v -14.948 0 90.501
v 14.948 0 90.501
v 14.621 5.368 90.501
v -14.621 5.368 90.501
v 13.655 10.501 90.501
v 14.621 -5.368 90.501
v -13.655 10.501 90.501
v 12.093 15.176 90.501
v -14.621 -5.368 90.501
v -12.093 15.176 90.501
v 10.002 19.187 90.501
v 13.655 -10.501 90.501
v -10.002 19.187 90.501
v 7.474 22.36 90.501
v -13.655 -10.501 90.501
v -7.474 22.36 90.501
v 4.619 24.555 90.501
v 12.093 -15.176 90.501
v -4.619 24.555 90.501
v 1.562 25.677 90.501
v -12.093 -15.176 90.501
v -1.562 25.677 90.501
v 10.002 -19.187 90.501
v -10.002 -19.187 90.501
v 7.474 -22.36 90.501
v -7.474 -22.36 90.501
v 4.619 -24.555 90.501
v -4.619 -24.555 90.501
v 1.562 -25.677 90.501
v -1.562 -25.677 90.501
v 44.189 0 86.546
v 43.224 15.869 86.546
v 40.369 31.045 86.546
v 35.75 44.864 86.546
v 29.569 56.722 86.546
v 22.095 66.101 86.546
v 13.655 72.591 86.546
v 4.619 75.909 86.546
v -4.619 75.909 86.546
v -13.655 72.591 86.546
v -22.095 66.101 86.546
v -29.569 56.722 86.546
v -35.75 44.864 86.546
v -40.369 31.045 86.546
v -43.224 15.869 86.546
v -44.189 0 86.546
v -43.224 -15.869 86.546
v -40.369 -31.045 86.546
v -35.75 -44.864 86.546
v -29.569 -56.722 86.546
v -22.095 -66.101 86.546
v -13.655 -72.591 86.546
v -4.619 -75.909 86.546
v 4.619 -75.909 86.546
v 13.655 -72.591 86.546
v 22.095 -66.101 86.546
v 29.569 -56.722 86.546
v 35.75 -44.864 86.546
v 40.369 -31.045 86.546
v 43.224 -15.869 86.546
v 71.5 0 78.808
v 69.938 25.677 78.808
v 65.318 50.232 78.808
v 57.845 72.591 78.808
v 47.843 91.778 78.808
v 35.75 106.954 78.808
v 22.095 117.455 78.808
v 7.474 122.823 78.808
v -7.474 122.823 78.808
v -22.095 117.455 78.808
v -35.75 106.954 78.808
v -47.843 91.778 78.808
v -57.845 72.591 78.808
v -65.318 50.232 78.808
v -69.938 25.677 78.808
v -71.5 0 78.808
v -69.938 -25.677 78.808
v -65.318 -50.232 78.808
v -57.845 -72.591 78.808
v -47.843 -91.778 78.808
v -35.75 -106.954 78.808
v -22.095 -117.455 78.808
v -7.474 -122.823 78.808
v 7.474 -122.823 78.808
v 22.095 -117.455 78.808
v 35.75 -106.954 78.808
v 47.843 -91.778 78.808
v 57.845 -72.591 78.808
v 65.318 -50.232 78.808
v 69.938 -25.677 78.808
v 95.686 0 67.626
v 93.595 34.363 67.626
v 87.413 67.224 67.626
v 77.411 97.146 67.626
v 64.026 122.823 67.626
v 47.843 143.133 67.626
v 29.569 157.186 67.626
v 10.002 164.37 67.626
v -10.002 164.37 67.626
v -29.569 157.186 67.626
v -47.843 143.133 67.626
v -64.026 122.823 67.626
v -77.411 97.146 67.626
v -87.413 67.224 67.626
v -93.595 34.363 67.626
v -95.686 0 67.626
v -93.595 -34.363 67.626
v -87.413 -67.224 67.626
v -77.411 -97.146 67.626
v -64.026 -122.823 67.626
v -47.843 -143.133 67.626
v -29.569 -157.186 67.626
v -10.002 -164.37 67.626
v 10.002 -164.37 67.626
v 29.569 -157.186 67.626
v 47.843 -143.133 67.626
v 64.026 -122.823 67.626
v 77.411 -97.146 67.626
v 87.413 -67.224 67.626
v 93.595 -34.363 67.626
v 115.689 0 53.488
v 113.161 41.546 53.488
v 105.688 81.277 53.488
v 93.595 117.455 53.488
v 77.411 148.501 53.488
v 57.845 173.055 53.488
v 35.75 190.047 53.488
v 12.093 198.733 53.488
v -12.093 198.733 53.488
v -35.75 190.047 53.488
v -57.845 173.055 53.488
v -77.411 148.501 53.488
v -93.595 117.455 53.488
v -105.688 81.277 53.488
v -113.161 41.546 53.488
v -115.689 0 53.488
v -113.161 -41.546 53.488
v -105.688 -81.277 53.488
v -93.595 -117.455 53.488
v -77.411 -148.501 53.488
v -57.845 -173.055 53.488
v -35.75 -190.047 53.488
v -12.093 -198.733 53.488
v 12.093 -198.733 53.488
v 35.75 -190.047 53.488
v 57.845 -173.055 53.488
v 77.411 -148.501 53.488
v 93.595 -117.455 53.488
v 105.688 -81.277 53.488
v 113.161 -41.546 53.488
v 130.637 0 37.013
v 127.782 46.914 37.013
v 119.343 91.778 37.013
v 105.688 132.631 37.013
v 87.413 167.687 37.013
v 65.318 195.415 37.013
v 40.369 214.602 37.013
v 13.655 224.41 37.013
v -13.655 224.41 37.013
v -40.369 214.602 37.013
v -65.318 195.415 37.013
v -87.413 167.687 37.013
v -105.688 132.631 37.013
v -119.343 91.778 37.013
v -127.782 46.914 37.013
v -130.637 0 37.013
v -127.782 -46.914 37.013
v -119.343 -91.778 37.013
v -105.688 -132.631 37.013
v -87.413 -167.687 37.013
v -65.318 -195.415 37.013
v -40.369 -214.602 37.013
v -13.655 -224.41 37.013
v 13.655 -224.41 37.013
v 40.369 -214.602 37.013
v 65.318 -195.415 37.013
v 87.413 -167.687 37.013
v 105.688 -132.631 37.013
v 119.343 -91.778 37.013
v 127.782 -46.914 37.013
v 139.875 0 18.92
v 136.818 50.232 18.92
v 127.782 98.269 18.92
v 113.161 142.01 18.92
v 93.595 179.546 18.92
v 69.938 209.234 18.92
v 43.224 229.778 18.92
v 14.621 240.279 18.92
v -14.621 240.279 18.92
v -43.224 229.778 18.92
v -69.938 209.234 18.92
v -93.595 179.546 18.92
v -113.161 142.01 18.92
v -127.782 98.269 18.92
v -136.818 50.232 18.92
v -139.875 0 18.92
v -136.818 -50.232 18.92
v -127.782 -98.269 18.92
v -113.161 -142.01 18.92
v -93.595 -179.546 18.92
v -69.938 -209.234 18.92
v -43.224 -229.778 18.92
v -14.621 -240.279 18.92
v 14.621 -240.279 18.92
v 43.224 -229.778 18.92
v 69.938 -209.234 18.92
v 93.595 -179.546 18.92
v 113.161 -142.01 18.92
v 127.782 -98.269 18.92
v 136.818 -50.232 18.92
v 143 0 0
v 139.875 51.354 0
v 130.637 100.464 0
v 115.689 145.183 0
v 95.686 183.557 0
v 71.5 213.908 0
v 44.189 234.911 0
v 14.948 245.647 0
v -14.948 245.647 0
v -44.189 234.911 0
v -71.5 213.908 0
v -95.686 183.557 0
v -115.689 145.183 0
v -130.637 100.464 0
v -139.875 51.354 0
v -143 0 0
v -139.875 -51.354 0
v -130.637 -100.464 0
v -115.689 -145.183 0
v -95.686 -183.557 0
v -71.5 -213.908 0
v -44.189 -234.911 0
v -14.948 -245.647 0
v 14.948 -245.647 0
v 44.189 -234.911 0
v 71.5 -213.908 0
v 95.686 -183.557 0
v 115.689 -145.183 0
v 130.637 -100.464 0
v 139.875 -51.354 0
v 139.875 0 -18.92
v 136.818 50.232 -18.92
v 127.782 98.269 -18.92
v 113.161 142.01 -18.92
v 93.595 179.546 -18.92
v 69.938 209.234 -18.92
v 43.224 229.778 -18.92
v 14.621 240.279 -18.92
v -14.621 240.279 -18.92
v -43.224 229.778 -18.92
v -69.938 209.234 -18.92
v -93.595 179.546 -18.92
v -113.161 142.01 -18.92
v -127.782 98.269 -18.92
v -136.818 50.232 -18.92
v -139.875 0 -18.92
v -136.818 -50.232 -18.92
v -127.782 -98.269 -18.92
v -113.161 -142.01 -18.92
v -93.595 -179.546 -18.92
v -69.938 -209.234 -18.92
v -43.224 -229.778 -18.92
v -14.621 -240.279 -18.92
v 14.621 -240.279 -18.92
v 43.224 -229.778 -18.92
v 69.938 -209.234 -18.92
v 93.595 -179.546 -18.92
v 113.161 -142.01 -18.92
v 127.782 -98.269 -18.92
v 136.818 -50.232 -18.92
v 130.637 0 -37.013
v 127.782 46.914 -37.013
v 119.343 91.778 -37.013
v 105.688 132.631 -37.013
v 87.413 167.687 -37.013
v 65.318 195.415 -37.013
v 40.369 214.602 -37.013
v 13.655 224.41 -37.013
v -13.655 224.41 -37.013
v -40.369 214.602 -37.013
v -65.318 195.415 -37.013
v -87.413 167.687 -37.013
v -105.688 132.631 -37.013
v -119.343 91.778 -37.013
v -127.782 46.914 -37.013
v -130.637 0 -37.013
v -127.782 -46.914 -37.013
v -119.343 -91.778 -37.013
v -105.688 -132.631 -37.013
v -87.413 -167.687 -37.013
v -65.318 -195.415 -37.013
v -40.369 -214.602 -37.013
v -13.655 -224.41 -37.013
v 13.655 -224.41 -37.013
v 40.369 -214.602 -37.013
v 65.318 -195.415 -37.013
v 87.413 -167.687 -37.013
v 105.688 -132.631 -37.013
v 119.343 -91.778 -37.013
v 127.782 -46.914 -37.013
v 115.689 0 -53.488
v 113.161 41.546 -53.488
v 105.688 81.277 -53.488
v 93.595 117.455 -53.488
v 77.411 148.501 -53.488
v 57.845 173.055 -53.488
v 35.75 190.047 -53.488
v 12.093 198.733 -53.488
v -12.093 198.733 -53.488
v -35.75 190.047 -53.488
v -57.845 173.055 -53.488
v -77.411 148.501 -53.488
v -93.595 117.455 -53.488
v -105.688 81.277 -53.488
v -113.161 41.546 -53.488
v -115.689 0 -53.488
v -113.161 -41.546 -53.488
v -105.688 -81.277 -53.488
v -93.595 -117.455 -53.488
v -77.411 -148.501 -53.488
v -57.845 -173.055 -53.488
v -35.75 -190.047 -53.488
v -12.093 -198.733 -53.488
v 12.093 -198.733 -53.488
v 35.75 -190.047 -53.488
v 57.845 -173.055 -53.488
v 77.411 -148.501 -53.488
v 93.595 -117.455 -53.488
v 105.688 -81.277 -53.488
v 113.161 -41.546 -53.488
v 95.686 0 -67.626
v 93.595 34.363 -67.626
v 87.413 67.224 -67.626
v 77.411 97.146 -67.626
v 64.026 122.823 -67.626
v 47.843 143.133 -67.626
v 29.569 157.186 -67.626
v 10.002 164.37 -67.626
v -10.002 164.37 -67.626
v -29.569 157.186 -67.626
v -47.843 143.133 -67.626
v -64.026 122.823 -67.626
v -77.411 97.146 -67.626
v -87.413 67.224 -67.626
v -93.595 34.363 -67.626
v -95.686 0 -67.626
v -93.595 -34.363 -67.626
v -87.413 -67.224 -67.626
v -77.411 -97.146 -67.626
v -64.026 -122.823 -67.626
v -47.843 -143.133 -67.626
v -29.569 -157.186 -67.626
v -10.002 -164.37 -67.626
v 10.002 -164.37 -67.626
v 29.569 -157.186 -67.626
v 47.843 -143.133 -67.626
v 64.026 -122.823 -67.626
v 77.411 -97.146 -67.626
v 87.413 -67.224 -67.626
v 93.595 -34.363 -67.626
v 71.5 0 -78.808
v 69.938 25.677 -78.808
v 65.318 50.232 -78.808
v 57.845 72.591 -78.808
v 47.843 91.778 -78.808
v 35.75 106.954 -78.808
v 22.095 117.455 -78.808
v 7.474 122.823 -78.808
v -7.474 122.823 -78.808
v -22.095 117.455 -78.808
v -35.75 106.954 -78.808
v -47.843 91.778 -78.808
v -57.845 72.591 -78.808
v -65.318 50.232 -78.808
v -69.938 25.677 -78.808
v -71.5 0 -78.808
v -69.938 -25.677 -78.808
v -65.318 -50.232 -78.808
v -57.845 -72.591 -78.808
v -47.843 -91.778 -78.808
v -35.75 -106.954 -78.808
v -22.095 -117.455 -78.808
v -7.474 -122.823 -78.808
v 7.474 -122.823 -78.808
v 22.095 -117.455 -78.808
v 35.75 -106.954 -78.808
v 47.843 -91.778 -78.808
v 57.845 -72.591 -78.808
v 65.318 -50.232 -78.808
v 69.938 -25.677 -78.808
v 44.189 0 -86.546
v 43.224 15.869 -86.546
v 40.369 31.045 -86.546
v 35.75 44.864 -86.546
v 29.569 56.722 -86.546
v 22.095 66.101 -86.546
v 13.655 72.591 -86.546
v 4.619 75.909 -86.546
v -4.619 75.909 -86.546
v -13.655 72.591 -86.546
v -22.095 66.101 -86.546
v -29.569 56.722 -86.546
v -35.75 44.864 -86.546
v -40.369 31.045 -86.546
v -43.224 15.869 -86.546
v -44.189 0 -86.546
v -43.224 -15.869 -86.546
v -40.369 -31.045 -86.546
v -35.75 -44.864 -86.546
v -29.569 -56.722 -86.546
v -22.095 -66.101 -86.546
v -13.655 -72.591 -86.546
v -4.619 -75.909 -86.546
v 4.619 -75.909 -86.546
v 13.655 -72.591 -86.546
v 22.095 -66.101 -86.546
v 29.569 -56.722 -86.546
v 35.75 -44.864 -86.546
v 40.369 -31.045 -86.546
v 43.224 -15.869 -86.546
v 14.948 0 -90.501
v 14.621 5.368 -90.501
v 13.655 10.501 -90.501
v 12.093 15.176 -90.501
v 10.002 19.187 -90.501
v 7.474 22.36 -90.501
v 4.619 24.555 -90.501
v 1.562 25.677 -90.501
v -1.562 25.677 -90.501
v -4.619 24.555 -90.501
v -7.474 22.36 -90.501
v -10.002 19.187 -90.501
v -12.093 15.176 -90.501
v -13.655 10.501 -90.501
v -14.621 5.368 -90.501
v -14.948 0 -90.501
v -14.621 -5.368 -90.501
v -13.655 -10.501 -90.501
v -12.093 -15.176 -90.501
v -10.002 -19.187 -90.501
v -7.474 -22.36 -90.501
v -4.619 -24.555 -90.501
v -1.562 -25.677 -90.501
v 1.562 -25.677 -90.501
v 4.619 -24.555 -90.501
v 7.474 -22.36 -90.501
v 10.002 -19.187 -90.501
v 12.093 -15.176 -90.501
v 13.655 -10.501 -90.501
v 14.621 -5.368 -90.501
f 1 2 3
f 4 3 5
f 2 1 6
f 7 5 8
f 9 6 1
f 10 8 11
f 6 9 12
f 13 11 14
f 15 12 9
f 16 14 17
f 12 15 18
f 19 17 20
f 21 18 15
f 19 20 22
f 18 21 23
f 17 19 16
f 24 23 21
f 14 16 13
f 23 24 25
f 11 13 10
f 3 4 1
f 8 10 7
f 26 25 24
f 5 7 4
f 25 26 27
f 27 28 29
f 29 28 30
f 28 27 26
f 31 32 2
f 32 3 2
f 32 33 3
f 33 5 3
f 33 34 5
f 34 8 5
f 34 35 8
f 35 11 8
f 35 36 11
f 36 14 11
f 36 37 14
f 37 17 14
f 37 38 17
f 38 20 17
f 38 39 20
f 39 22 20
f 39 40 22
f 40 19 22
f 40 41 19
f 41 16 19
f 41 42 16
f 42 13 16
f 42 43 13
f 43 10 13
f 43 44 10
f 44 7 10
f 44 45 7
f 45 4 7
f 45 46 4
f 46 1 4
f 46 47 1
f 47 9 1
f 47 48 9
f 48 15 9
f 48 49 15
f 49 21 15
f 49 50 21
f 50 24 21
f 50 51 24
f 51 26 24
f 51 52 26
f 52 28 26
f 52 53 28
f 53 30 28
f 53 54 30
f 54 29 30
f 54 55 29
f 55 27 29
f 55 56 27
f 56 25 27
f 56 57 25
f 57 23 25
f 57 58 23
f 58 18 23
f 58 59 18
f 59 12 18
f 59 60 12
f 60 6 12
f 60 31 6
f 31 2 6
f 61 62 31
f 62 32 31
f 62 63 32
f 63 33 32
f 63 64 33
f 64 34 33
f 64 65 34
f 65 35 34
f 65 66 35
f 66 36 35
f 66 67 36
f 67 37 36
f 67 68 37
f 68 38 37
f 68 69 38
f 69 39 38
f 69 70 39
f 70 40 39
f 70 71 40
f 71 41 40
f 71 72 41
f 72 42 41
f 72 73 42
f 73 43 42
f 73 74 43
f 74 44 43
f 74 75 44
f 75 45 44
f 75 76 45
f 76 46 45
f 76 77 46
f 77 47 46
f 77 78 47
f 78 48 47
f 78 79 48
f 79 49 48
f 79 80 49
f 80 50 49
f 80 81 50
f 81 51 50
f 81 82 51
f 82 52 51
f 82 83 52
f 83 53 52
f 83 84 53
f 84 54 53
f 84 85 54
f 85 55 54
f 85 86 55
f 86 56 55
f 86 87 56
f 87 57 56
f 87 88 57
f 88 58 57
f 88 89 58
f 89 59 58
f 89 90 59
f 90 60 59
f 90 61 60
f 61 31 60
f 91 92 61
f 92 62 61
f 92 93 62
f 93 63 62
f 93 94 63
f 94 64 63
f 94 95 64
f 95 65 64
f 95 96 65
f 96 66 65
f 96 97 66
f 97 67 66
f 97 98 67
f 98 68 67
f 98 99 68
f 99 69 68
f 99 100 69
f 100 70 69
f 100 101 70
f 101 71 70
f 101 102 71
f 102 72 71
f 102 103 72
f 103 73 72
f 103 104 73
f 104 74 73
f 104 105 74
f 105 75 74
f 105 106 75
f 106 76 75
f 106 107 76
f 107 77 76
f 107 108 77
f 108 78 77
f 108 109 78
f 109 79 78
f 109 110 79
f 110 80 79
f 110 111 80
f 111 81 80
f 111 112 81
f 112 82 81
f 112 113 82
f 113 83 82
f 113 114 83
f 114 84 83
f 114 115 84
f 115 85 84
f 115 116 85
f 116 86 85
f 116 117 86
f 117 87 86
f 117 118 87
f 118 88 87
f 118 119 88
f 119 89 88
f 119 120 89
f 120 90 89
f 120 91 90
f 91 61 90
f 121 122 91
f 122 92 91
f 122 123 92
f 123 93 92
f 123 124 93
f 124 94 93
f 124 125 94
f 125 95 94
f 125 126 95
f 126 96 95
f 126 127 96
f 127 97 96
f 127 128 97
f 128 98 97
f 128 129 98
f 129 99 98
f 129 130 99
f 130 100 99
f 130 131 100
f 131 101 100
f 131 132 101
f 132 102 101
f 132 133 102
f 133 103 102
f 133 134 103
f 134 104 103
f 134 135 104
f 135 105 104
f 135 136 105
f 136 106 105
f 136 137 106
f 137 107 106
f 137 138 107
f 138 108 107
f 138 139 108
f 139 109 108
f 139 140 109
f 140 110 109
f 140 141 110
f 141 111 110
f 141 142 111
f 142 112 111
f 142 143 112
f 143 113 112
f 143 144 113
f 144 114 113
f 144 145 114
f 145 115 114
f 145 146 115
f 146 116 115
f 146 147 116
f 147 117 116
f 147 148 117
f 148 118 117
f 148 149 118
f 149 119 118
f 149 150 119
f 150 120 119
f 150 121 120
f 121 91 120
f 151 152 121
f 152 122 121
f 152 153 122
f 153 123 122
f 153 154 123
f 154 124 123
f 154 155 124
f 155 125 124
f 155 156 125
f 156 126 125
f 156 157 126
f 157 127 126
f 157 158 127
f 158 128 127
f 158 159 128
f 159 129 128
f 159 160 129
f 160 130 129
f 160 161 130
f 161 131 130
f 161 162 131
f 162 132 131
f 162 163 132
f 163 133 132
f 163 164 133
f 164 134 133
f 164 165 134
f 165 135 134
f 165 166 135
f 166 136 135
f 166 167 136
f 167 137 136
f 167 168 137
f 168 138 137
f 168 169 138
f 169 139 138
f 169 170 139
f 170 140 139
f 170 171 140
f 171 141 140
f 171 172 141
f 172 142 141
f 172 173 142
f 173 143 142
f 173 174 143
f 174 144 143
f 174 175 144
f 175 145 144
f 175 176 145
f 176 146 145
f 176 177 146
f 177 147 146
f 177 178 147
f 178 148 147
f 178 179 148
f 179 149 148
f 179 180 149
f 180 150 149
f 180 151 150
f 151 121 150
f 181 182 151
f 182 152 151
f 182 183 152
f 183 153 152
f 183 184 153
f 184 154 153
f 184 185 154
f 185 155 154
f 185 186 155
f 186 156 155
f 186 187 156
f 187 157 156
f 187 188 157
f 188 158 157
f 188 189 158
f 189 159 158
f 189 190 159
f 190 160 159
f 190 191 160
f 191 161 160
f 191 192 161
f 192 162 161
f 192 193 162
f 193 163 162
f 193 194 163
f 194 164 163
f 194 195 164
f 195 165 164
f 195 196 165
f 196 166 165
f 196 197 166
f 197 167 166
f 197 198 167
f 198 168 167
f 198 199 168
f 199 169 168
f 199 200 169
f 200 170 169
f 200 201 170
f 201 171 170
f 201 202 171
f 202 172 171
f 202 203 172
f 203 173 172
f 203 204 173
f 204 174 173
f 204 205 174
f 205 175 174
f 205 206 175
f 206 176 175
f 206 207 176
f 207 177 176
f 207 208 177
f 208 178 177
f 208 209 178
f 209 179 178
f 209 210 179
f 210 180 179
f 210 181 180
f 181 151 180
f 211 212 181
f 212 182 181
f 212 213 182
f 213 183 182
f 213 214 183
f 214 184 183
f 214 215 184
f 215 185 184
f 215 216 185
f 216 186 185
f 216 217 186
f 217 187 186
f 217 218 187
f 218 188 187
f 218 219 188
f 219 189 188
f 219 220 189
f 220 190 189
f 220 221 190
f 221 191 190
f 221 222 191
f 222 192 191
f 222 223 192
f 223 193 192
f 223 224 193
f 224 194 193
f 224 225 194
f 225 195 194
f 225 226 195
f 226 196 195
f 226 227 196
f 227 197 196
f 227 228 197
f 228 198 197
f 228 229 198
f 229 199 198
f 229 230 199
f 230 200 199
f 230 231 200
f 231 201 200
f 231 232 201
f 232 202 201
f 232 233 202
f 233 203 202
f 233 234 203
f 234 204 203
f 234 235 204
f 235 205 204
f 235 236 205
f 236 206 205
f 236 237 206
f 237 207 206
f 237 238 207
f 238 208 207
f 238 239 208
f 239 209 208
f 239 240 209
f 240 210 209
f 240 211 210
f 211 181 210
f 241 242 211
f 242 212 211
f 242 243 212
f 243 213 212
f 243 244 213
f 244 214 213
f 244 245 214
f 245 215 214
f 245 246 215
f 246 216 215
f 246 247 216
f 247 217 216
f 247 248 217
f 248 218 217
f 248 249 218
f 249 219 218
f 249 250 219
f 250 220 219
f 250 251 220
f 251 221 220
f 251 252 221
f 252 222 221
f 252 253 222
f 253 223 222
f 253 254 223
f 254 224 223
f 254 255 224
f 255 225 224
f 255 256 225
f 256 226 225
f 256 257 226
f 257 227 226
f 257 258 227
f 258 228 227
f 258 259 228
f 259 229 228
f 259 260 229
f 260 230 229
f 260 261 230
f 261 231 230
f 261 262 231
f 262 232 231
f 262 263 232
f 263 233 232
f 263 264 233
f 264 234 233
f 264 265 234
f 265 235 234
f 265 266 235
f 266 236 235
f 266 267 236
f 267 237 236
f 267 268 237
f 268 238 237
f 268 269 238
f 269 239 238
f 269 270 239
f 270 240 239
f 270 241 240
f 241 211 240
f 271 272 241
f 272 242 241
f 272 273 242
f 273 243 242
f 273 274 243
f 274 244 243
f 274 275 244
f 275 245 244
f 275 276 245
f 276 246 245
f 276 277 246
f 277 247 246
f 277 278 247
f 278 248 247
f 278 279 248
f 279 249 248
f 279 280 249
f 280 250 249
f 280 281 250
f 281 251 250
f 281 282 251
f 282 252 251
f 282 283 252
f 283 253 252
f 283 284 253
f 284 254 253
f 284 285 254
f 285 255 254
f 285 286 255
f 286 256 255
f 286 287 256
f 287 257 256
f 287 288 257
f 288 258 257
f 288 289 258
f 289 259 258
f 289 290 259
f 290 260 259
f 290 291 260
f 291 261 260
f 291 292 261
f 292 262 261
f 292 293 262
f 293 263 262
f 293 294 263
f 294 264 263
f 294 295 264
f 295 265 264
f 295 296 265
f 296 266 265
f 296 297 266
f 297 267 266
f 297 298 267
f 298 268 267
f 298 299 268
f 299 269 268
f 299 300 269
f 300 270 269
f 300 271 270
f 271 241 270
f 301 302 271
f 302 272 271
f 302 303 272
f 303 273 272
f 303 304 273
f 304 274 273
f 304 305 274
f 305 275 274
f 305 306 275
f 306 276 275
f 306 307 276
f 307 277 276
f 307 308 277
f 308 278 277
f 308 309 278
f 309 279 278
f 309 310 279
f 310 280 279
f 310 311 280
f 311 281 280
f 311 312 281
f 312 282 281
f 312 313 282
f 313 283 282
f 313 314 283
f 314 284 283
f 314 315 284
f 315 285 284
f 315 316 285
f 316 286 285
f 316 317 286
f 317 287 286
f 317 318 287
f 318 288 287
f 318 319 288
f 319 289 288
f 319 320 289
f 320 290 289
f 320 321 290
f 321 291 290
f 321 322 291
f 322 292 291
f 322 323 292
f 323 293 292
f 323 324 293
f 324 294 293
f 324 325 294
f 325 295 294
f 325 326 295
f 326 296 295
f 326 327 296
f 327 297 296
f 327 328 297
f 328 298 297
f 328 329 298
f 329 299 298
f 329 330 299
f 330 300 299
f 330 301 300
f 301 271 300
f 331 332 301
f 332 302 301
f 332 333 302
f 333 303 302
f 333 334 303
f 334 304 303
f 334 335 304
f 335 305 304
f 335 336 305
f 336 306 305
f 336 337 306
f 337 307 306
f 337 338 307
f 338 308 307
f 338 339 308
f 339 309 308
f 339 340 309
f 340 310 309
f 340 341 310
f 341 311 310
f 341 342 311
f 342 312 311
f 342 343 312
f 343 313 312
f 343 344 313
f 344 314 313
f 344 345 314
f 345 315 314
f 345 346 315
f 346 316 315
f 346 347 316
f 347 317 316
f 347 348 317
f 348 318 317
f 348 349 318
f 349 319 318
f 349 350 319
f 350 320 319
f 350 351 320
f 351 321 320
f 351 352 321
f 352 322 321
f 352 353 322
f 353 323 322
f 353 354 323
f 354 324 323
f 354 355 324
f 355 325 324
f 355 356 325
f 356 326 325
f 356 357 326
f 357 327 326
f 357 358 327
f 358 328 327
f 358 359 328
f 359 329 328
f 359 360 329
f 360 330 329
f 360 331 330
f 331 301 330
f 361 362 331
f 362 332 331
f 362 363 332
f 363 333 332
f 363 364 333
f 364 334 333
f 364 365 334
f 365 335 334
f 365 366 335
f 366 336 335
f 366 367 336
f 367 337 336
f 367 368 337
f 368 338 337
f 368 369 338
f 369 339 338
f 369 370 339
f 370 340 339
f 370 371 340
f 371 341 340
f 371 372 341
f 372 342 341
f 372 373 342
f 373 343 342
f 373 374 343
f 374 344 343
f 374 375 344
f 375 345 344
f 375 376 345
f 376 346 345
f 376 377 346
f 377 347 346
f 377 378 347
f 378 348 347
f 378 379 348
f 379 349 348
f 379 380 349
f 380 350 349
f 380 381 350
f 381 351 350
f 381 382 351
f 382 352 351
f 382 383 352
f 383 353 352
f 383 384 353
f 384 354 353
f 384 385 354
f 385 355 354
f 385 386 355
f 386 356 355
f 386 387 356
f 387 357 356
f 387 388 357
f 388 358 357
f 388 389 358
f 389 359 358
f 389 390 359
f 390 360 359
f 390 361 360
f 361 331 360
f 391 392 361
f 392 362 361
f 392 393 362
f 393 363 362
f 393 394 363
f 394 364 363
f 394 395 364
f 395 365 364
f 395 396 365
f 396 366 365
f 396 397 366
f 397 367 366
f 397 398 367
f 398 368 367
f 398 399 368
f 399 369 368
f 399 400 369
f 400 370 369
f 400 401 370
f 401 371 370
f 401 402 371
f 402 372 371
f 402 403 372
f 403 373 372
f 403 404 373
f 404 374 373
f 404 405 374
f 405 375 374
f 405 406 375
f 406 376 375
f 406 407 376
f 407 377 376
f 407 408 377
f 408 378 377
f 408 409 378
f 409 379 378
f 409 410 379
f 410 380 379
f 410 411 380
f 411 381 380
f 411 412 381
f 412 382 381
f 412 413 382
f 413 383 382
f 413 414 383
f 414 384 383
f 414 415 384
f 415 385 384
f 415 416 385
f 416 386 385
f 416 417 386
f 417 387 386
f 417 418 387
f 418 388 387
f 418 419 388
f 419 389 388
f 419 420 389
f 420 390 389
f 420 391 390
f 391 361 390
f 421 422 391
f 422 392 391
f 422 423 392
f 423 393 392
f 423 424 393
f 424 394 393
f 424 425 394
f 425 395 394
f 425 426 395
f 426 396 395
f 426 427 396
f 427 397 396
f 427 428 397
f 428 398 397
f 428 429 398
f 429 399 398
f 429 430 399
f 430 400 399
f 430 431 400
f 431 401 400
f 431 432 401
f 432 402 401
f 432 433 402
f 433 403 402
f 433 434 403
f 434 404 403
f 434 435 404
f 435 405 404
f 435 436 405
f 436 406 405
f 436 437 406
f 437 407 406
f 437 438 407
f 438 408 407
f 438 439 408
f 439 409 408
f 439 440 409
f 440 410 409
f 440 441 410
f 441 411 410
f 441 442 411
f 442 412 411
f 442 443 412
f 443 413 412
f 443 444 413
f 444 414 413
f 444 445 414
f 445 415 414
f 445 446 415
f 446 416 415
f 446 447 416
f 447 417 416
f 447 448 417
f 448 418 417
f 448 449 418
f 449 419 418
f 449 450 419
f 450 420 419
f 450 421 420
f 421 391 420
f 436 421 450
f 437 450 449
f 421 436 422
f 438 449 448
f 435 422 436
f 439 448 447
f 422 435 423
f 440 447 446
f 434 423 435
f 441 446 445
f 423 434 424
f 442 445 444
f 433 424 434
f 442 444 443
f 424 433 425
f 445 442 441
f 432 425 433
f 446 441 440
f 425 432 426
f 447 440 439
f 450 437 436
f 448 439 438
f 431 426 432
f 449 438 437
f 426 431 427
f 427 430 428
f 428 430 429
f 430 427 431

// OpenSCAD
// Generated by SolidPython 1.0.1 on 2020-07-29 00:46:50


scale(v = [11, 19, 7]) {
	sphere(r = 13);
}
/***********************************************
*********      SolidPython code:      **********
************************************************
 
# import packages: SolidPython
from solid import *
from solid.utils import *
from itertools import chain, combinations, permutations


class Resize:

    def __init__(self, scad_file):
        self.scad_file = scad_file
        #self.scad_file = import_scad(scad_file)
        # cone/cylinder param:
        self.r1 = 0
        self.r2 = 0
        self.h = 0
        # rectangular prism param:
        self.w = 0
        self.l = 0
        # ellipse param:
        self.r = 0

    # import OpenScad code (file name corresponds to shape)


    # classify shape + parameters
    def assign(self, param1, param2, param3):
        if self.scad_file == 'cone.scad':
            self.r1 = param1
            self.r2 = param2
            self.h = param3
        elif self.scad_file == 'cylinder.scad':
            self.r1 = param1
            self.r2 = param2
            self.h = param3
        elif self.scad_file == 'rectangularPrism.scad':
            self.h = param1
            self.l = param2
            self.w = param3
        else:
            self.r = param1
            self.h = param2

    # resize parameters
    def iterate(self):
        x = range(3, 20, 2)
        i = 1
        if self.scad_file == 'cone.scad':
            tempList = list(permutations(x, 2))
            for temp in tempList:
                param1 = temp[0]
                param2 = temp[1]
                filepath = 'produced_scad_files/' + 'cone' + str(param1) + '_' + str(param2) + '_' + '.scad'
                scad_render_to_file(cylinder(h=param1, r1=param2, r2=0), filepath)

        elif self.scad_file == 'cylinder.scad':
            tempList = list(permutations(x, 3))
            for temp in tempList:
                param1 = temp[0]
                param2 = temp[1]
                filepath = 'produced_scad_files/' + 'cylinder' + str(param1) + '_' + str(param2) + '_' + '.scad'
                scad_render_to_file(cylinder(h=param1, r1=param2, r2=param2), filepath)

        elif self.scad_file == 'rectangularPrism.scad':
            tempList = list(permutations(x, 3))
            for temp in tempList:
                param1 = temp[0]
                param2 = temp[1]
                param3 = temp[2]
                filepath = 'produced_scad_files/' + 'rectangularPrism' + str(param1) + '_' + str(param2) + '_' + str(
                    param3) + '.scad'
                scad_render_to_file(cube(size=(param1, param2, param3)), filepath)

        elif self.scad_file == 'ellipse.scad':
            tempList = list(permutations(x, 4))
            for temp in tempList:
                param1 = temp[0]
                param2 = temp[1]
                param3 = temp[2]
                param4 = temp[3]
                filepath = 'produced_scad_files/' + 'ellipse' + str(param1) + '_' + str(param2) + '_' + str(param3) + '_' + str(param4) + '.scad'
                scad_render_to_file(scale([param1, param2, param3])(sphere(r=param4)), filepath)

    def render_to_scadfile(self):
        scad_render_to_file(scad, 'example.scad') 
 
************************************************/
